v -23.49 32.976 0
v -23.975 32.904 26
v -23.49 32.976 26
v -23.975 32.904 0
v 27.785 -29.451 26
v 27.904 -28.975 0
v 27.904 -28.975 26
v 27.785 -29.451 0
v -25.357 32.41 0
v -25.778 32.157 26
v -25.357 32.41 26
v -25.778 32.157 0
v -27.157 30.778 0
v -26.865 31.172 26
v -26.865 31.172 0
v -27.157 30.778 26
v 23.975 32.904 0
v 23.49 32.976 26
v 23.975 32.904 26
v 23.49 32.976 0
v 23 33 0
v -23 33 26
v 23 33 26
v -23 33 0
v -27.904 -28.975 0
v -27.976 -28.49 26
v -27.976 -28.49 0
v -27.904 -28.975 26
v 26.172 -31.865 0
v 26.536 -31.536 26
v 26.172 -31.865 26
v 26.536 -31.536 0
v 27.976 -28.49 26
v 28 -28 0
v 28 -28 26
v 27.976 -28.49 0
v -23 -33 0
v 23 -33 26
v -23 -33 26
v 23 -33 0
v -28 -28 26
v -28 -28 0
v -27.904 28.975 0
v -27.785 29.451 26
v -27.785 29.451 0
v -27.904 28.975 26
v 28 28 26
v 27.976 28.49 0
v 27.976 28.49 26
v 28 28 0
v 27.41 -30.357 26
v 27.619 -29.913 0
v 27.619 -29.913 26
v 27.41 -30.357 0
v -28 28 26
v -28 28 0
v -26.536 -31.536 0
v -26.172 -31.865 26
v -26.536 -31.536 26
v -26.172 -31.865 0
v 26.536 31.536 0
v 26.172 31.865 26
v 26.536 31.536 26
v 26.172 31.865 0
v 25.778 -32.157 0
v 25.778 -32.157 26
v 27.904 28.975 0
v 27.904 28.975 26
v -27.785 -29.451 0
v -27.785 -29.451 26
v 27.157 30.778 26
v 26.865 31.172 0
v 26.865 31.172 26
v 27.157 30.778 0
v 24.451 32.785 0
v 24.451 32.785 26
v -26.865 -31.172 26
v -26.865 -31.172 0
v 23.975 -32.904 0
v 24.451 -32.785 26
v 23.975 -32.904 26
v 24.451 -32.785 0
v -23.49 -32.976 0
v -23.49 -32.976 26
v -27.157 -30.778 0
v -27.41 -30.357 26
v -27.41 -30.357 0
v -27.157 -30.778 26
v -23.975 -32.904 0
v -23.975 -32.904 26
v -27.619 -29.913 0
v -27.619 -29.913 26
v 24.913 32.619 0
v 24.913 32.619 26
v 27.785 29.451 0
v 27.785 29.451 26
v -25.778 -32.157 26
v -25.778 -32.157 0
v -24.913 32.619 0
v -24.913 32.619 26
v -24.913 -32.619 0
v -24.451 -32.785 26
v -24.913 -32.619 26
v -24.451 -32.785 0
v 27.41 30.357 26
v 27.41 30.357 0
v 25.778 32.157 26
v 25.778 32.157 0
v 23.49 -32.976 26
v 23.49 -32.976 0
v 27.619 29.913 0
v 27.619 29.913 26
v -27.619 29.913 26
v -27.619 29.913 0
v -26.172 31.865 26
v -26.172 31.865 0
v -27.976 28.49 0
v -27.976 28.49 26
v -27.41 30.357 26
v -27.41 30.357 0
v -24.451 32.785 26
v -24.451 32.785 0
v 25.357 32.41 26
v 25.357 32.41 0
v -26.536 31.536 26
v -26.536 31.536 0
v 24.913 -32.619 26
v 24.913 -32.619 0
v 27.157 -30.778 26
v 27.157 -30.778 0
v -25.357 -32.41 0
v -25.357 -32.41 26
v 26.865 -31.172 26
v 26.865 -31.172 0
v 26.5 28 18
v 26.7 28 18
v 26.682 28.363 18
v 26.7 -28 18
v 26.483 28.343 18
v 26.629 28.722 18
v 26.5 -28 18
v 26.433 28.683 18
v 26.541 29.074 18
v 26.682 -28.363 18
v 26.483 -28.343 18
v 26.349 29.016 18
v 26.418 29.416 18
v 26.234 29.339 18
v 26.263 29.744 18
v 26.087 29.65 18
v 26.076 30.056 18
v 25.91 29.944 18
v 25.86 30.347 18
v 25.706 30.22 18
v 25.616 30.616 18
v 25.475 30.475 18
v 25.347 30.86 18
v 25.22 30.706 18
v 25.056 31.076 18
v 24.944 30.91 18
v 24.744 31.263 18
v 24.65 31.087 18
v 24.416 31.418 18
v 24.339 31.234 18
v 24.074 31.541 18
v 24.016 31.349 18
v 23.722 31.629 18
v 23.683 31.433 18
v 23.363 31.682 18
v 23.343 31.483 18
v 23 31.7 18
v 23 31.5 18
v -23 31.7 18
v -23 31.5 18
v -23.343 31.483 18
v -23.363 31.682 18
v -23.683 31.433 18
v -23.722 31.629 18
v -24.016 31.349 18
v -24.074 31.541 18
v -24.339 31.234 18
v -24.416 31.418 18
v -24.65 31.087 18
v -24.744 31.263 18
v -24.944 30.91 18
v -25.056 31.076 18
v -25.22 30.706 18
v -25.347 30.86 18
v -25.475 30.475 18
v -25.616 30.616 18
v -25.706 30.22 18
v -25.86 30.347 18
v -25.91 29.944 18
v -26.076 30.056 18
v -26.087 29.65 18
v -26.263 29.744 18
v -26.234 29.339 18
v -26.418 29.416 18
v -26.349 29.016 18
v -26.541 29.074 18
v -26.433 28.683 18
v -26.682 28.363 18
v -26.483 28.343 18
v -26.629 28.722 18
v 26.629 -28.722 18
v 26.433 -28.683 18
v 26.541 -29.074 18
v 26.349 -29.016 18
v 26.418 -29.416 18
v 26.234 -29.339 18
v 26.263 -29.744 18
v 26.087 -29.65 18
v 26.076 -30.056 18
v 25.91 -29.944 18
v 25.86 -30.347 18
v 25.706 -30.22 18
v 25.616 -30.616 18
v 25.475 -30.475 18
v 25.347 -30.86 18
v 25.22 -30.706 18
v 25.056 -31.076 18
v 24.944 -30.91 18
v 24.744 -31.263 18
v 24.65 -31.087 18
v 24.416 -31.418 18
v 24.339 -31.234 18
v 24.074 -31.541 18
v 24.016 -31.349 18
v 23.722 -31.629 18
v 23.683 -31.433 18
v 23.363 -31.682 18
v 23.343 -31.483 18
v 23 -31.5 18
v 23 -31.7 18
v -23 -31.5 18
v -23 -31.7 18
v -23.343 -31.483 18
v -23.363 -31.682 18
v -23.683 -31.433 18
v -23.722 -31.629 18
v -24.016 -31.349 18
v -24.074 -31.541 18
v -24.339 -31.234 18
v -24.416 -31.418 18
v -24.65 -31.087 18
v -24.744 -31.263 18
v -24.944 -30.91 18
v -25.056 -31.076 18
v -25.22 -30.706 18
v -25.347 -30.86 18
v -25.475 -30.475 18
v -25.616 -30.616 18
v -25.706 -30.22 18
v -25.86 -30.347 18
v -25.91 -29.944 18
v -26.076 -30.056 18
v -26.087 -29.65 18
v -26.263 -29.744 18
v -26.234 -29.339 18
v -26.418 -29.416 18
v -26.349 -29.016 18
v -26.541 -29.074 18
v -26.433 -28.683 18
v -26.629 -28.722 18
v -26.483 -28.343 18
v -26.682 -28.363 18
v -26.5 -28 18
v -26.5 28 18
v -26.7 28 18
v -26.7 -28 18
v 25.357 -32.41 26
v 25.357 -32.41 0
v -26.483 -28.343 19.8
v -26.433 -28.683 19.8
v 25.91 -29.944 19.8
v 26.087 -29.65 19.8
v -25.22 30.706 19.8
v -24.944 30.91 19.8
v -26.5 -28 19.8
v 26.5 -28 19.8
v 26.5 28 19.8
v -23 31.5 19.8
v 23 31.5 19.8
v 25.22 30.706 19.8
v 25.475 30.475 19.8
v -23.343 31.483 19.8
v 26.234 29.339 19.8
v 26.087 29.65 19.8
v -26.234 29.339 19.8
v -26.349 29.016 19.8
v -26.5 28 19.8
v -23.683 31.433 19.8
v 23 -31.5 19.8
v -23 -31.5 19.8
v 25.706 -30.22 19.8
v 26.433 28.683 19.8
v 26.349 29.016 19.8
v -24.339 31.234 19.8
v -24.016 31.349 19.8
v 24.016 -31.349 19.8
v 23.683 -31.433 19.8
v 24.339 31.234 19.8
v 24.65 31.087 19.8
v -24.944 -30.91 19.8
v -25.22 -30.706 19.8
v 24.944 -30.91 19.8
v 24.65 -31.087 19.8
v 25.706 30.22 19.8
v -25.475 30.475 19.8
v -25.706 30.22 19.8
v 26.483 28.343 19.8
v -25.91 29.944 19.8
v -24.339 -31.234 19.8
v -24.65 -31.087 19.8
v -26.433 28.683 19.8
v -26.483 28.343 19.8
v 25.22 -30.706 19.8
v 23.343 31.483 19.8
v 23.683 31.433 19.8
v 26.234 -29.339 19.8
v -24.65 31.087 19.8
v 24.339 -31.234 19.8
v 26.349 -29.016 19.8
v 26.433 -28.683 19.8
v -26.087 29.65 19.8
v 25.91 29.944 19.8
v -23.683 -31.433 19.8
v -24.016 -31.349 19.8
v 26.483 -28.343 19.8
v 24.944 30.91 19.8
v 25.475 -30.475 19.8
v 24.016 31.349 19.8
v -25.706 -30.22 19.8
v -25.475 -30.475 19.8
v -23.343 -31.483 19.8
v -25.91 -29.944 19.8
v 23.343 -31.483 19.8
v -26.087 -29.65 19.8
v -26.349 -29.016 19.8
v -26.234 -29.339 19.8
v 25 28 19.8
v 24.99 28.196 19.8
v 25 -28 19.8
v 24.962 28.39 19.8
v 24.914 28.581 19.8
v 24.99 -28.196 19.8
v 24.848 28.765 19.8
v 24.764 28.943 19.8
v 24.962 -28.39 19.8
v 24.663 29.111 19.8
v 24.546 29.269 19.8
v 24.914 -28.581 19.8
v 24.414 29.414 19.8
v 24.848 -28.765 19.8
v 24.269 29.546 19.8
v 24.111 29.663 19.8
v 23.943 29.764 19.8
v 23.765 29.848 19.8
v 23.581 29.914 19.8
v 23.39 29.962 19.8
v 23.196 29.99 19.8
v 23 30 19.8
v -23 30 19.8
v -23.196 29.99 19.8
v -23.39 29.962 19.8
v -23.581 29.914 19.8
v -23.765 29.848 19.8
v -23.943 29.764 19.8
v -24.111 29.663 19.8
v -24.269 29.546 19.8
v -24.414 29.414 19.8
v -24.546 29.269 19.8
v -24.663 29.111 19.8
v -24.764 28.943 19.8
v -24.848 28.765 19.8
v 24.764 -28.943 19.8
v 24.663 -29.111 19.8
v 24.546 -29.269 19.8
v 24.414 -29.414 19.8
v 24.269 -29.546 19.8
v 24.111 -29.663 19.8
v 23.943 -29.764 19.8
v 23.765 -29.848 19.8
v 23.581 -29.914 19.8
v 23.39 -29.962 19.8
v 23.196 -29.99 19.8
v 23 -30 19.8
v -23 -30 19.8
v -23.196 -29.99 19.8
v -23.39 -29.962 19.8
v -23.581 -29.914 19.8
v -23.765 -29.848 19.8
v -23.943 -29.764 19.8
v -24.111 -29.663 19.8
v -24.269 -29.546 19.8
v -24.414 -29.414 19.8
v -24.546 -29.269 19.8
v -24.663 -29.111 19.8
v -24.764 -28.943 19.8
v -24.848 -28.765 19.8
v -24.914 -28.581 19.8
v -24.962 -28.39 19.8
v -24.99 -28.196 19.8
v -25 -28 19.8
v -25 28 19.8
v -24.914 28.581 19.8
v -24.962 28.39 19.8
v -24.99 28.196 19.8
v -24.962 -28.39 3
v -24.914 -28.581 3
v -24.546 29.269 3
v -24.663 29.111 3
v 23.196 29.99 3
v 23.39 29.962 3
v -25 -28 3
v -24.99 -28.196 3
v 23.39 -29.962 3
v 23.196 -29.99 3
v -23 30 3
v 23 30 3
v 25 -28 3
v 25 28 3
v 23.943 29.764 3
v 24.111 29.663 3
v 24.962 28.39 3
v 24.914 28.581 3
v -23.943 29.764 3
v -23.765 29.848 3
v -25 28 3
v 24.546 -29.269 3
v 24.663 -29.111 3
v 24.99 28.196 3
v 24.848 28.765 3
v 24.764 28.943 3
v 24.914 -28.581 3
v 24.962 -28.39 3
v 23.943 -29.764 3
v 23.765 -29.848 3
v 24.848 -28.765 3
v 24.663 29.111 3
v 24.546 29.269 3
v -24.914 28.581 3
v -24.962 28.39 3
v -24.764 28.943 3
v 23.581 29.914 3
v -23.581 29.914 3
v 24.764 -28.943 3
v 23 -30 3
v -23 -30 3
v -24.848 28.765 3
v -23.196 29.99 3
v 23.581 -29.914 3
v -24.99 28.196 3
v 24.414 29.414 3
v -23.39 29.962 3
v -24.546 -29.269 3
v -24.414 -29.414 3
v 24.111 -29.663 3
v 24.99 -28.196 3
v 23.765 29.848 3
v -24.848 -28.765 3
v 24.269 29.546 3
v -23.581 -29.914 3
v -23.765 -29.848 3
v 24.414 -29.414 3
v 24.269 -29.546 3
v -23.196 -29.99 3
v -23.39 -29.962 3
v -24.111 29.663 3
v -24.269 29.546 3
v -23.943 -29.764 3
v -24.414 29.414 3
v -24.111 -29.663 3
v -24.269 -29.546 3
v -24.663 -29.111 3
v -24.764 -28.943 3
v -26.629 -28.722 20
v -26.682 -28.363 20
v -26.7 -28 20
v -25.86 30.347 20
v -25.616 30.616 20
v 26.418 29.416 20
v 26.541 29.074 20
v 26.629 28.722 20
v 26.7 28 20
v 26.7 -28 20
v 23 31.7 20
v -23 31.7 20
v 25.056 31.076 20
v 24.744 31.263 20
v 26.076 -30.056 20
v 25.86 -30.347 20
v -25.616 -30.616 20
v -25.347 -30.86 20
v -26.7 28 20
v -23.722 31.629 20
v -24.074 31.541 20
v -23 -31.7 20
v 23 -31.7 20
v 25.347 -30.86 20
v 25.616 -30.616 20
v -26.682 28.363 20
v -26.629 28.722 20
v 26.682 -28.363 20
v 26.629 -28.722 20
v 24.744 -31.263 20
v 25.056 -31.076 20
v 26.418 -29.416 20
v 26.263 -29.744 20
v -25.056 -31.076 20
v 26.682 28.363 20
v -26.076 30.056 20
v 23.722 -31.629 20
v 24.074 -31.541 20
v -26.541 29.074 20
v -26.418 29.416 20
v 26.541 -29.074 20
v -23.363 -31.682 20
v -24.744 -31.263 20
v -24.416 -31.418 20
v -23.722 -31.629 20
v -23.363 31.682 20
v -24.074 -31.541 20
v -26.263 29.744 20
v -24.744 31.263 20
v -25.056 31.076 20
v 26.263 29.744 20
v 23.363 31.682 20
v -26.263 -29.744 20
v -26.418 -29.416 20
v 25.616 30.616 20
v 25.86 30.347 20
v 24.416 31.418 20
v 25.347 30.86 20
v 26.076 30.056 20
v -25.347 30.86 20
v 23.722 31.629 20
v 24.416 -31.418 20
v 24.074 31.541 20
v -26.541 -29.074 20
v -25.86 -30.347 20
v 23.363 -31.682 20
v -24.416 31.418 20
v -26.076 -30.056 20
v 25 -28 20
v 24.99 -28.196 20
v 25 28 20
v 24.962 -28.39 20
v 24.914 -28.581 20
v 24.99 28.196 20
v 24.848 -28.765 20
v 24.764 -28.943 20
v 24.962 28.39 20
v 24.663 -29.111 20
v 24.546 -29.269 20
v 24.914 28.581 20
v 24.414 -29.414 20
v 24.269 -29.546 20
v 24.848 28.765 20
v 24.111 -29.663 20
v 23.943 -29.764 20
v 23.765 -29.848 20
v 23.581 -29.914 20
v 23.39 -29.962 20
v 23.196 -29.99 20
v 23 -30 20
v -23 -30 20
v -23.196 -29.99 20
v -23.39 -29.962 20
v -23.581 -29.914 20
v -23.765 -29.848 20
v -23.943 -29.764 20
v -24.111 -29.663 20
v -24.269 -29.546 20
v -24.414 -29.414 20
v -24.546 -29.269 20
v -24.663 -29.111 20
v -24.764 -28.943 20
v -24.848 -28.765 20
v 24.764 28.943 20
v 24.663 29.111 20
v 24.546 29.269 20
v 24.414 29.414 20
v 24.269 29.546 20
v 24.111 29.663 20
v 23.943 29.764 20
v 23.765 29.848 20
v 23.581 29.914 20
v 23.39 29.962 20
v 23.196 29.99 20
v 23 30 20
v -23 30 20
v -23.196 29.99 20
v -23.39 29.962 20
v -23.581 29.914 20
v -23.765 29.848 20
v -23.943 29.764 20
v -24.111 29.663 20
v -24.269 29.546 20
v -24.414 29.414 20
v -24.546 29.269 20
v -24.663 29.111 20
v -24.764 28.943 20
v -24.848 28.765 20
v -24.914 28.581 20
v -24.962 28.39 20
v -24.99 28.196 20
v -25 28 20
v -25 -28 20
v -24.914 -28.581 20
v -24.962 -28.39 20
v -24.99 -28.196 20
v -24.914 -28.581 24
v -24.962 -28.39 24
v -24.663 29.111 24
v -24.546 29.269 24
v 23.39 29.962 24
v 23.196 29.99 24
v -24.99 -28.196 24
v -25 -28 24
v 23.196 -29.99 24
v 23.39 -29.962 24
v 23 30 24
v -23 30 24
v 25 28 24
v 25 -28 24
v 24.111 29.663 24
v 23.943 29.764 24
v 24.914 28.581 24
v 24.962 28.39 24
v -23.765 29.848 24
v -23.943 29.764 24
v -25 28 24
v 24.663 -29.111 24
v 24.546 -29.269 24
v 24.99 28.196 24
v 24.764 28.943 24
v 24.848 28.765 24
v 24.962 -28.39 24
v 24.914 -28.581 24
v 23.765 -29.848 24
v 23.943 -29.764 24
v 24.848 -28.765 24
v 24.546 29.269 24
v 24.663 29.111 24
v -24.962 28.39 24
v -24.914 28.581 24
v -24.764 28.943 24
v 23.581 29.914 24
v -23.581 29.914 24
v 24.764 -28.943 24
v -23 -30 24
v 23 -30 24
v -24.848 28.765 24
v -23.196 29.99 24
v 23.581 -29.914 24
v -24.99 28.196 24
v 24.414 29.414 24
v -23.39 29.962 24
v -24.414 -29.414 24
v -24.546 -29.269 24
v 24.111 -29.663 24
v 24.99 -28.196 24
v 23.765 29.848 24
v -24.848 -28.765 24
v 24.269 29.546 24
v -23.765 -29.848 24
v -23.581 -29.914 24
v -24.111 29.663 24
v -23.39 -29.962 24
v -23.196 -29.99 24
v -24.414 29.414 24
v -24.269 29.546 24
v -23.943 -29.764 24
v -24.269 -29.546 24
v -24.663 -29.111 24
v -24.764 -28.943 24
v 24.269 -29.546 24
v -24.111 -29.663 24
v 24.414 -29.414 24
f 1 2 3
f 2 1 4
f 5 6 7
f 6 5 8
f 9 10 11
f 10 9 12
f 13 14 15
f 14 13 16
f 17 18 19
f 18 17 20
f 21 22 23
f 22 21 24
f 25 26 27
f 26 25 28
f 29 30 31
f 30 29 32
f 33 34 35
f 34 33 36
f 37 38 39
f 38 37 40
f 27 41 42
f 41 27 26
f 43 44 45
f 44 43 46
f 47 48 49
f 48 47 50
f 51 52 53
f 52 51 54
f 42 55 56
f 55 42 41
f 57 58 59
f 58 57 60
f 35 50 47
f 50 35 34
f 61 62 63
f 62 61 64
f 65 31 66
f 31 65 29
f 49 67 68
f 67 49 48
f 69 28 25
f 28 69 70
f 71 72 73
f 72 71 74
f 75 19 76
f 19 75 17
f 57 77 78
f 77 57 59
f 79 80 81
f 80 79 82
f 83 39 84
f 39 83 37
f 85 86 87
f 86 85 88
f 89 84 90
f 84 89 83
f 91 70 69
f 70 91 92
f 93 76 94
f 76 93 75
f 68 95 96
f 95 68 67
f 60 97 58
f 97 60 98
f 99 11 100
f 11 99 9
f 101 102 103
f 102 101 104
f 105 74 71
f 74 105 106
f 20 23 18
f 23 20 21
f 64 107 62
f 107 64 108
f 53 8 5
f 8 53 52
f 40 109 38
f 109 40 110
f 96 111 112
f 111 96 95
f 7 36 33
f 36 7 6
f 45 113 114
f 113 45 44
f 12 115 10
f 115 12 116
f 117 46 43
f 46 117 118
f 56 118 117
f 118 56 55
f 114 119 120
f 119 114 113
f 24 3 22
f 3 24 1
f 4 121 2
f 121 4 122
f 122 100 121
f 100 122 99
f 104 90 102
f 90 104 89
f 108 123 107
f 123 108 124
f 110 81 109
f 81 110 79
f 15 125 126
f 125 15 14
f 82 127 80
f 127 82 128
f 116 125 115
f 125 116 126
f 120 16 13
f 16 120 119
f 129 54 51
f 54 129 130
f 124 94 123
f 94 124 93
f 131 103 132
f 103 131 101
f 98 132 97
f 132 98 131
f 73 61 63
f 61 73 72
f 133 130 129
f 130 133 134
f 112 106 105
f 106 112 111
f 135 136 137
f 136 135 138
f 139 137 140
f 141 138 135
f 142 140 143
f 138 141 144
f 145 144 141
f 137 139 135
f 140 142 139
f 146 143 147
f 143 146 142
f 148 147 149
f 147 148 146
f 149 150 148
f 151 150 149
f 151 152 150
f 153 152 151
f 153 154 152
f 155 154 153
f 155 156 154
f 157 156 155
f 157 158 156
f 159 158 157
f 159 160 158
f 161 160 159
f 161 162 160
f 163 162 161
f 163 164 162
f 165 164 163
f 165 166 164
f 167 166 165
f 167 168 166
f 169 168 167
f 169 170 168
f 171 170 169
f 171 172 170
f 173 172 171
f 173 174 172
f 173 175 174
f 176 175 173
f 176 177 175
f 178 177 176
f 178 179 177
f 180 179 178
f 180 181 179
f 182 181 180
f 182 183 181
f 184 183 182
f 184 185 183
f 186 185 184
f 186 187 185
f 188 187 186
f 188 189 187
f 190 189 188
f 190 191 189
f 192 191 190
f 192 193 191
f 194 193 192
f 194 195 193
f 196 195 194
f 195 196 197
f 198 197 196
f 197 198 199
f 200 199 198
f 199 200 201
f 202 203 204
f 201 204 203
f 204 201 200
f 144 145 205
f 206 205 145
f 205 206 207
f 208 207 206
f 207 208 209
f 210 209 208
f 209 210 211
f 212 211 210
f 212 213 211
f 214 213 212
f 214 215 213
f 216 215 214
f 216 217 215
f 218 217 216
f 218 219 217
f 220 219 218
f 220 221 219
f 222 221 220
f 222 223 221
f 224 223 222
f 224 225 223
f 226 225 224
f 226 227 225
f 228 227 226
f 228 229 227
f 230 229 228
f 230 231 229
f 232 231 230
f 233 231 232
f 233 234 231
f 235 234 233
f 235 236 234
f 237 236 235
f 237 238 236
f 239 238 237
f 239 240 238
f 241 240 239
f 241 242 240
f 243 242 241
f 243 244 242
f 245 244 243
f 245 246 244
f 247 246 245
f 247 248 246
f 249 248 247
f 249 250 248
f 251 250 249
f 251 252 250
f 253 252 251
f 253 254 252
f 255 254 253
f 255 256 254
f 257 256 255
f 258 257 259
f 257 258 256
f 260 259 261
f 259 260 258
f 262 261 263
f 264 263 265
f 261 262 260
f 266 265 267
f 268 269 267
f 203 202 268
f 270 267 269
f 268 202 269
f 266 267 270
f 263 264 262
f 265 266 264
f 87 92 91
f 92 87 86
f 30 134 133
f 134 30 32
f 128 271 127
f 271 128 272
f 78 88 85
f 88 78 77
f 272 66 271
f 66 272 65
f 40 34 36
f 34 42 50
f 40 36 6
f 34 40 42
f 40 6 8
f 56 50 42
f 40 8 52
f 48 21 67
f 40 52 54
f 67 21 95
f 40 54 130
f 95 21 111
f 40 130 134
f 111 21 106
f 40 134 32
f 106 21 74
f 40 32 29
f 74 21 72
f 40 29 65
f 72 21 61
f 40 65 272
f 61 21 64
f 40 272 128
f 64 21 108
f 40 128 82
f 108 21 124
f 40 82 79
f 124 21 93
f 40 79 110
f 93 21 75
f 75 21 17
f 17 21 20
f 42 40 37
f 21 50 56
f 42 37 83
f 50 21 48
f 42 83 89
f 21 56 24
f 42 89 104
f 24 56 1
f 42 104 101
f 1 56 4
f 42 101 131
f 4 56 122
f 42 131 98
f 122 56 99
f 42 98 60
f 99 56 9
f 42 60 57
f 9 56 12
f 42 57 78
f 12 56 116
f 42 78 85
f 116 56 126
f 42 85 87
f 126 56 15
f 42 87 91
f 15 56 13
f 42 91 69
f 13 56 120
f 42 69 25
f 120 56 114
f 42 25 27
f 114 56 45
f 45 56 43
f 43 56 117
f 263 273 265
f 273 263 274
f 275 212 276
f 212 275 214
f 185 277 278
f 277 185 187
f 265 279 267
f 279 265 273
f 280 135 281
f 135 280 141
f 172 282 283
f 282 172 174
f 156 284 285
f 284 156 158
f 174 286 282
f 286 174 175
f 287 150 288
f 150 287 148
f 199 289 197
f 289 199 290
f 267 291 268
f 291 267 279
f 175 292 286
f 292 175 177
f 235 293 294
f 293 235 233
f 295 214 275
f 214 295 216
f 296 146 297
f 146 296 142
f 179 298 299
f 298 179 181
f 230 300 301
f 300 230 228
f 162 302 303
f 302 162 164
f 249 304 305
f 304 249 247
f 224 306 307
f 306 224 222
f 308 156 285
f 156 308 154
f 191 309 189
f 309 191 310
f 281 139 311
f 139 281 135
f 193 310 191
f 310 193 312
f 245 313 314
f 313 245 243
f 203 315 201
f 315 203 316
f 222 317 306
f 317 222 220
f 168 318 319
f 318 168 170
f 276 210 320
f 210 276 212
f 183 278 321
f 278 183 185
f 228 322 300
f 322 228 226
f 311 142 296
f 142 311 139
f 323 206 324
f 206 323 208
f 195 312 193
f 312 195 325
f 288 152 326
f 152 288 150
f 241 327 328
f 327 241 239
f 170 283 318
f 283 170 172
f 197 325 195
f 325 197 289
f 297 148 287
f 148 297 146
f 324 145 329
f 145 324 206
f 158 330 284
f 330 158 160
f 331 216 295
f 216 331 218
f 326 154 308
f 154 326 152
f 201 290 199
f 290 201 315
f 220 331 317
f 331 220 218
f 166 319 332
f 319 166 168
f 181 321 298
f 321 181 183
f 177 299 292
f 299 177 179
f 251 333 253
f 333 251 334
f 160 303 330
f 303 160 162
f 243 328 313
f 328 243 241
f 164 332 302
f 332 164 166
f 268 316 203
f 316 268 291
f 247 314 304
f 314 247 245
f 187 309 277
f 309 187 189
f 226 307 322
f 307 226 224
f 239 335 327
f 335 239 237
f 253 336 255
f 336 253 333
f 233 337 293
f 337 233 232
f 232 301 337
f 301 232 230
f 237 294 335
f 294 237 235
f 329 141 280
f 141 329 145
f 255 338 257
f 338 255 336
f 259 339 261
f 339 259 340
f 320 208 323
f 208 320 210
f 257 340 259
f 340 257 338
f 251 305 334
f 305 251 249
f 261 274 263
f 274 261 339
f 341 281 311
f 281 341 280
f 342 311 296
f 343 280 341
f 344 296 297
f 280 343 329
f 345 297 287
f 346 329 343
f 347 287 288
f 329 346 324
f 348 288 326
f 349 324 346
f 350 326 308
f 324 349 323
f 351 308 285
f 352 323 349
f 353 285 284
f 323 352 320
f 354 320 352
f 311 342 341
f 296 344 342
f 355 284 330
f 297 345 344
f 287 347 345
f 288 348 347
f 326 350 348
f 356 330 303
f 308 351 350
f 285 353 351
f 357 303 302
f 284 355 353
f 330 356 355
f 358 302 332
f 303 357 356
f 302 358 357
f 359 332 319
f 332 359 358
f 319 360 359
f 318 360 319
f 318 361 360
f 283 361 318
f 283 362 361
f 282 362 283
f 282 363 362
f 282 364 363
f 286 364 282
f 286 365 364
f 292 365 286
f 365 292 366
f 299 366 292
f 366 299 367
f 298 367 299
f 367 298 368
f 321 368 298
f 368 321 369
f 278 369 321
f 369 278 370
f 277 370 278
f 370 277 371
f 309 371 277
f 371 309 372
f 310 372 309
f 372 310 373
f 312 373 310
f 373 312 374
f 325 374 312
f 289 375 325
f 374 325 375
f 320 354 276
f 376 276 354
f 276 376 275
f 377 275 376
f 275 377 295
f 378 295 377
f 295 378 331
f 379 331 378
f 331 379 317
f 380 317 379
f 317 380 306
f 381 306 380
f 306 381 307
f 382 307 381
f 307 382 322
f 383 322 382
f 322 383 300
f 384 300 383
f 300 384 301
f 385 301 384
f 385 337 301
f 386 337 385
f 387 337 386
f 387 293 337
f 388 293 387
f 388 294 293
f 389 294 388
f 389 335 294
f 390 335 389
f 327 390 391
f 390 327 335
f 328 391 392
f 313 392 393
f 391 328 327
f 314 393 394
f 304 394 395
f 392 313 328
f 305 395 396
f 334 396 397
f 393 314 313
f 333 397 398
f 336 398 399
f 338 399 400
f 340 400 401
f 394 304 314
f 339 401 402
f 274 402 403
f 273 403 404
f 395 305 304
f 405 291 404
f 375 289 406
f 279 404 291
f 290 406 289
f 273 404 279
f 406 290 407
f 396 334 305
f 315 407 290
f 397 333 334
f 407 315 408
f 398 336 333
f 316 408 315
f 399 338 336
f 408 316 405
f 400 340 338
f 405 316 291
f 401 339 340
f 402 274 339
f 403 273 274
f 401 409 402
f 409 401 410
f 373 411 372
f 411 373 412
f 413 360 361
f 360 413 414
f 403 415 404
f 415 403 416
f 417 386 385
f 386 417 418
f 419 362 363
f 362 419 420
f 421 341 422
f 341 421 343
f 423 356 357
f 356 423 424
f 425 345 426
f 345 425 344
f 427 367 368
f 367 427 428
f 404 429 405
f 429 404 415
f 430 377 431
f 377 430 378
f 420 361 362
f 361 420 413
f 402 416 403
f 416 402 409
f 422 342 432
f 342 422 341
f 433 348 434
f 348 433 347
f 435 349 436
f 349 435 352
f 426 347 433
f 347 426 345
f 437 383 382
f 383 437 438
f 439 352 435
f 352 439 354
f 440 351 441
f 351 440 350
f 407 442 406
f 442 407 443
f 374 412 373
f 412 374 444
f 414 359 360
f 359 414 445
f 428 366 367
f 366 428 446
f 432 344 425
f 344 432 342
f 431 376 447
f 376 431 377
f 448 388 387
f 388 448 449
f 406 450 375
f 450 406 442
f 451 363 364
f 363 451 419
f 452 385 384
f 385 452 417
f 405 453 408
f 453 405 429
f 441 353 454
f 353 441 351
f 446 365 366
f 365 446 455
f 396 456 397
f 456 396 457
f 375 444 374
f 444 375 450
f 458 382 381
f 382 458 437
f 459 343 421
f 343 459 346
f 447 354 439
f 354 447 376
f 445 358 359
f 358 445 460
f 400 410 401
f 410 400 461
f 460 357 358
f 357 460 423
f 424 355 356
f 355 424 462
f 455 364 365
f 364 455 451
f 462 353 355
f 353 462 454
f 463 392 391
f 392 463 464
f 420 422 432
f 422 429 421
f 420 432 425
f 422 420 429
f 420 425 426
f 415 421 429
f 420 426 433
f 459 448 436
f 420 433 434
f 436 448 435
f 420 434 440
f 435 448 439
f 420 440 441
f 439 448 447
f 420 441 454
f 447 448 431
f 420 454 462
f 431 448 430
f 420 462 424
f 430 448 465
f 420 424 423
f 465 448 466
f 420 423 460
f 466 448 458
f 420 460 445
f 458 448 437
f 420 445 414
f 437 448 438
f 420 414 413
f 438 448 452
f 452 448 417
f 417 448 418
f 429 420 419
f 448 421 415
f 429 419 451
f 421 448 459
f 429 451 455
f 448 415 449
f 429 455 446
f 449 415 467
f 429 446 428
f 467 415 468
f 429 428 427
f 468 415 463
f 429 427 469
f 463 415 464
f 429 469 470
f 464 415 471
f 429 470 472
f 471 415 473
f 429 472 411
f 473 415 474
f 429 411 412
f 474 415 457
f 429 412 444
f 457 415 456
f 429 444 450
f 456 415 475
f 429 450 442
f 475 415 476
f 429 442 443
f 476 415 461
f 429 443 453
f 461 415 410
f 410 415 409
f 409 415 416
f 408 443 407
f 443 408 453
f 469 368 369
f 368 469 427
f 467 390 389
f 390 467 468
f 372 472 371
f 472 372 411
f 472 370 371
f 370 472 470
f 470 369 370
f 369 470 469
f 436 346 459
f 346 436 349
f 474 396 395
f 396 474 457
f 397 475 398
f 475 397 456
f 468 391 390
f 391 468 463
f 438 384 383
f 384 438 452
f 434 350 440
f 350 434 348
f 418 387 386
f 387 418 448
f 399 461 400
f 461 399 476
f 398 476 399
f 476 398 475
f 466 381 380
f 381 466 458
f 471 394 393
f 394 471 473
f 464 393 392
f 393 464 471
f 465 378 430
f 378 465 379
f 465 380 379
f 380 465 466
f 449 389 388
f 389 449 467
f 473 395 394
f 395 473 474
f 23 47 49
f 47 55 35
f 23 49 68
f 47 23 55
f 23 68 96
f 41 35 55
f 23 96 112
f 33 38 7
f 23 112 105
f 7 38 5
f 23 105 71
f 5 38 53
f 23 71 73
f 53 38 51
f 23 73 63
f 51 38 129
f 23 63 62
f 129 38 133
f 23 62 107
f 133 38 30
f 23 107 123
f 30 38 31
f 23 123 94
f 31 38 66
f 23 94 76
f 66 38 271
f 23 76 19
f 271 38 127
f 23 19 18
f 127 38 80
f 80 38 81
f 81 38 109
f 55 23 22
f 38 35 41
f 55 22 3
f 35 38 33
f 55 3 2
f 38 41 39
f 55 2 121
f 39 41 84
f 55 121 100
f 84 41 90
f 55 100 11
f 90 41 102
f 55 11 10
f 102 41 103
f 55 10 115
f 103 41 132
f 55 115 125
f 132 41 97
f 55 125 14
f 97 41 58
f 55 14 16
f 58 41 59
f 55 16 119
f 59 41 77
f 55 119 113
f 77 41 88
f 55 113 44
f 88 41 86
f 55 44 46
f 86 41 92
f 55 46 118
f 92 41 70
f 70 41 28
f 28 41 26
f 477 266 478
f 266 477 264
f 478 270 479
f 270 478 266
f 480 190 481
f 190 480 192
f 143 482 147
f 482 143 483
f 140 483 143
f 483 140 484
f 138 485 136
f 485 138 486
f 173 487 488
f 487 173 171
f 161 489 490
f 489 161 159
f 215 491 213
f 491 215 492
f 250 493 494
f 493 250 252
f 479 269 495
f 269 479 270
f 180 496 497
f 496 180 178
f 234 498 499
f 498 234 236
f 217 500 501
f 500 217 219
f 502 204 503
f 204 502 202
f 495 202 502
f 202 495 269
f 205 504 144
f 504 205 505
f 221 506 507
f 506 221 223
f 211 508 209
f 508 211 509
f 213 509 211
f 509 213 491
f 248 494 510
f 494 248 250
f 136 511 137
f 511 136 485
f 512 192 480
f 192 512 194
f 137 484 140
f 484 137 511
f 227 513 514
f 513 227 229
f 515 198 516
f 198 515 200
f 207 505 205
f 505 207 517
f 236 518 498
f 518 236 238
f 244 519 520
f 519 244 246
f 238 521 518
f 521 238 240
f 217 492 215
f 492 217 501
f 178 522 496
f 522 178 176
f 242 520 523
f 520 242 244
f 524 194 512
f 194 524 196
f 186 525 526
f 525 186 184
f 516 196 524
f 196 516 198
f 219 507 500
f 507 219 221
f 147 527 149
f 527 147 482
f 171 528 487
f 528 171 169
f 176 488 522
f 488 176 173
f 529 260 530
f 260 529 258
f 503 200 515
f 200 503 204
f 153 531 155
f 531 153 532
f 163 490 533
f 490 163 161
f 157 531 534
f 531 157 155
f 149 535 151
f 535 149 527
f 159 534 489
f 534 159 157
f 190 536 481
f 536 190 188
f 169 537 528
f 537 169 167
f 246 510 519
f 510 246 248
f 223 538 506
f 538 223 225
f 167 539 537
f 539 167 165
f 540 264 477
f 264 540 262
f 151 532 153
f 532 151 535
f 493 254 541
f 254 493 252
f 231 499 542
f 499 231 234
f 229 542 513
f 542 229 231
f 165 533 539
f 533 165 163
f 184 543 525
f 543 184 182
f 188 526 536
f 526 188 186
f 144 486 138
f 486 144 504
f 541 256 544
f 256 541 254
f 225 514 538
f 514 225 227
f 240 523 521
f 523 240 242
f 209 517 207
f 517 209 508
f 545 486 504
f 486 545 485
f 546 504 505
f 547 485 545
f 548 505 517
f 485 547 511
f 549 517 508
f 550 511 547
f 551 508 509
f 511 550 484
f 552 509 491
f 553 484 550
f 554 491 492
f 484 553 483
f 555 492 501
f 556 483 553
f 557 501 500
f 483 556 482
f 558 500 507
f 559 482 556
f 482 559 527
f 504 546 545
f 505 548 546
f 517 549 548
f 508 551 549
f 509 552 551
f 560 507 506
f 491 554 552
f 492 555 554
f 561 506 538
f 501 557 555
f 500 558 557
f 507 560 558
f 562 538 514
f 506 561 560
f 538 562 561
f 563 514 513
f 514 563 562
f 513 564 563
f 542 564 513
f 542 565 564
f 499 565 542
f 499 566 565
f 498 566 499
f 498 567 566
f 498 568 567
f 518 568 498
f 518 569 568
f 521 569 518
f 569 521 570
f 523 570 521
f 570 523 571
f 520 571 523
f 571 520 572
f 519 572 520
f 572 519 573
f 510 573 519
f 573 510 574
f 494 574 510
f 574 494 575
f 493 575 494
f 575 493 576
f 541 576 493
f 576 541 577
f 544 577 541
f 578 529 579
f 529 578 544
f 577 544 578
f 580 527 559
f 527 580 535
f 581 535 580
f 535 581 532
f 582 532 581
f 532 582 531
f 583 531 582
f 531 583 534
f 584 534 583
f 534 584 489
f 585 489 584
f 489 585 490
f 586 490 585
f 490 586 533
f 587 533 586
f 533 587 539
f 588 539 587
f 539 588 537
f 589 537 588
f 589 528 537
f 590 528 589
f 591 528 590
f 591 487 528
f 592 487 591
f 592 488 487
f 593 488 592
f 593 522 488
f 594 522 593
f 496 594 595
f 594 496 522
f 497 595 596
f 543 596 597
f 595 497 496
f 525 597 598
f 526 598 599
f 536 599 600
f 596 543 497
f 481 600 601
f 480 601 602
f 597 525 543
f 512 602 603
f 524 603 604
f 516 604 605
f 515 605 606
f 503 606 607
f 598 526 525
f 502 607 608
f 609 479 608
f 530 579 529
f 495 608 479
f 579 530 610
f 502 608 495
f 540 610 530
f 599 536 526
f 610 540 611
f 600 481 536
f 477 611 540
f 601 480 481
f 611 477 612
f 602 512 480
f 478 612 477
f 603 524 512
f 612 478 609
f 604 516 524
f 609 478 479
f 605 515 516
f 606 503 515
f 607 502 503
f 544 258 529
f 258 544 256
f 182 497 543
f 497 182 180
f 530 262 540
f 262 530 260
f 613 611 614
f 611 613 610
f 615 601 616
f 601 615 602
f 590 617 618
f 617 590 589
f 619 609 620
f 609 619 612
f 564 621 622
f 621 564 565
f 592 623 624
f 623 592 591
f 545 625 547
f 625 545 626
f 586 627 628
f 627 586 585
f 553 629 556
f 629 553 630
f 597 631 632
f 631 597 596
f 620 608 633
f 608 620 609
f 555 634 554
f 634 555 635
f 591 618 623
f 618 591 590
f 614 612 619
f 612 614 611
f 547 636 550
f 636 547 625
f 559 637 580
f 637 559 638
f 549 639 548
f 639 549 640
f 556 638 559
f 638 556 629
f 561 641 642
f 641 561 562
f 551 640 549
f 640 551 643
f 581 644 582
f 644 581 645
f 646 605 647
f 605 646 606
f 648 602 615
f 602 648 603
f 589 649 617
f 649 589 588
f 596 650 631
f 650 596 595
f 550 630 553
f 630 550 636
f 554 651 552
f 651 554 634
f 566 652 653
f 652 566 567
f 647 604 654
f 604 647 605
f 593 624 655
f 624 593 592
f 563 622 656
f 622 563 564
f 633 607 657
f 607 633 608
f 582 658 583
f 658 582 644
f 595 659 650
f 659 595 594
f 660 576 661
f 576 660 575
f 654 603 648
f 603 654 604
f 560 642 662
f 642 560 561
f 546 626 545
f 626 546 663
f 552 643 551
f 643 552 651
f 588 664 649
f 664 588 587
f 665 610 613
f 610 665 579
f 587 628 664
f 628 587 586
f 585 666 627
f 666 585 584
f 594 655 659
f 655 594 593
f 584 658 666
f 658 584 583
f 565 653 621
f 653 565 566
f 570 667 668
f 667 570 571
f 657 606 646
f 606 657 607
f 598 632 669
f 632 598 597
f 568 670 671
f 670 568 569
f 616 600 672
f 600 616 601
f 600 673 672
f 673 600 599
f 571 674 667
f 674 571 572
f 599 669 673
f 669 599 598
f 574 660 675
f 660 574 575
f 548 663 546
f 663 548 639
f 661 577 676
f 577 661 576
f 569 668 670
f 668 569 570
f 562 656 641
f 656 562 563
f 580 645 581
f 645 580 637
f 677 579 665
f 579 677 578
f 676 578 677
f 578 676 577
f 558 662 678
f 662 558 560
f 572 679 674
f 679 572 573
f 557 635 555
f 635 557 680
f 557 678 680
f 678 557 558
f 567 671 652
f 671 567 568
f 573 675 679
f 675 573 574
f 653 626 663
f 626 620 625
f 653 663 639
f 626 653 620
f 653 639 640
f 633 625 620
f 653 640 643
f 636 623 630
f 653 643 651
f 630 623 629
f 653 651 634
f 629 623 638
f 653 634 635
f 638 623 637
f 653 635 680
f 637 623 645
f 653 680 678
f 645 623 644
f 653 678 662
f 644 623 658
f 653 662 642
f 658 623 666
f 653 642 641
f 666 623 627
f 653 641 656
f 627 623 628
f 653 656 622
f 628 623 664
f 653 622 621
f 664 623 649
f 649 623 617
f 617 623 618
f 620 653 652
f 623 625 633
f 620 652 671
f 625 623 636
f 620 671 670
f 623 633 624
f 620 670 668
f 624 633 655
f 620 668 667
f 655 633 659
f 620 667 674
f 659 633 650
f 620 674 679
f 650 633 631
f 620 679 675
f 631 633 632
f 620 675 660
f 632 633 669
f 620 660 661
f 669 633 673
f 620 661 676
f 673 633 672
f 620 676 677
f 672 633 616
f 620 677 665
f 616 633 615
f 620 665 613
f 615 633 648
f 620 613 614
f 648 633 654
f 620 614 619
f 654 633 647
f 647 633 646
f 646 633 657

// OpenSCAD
// ============================================================================
// 3D-PRINTABLE TWO-PART ENCLOSURE WITH SHIPLAP JOINT
// ============================================================================
// Designed by: Senior Mechanical & DFM Engineer
// Cavity Size: 50 x 60 x 20 mm (Minimum)
// Wall Thickness: 3.0 mm
// Nominal Print Clearance: 0.2 mm
//
// DESIGN & DFM FEATURES:
// 1. Shiplap (stepped) joint provides dust protection and self-alignment.
// 2. 0.2 mm horizontal and vertical clearances prevent interference.
// 3. Flat bottom and top surfaces ensure excellent bed adhesion (no supports).
// 4. Fully parameterized model.
// ============================================================================

/* [View Options] */
// Select assembly view mode
view_mode = "assembled"; // [assembled, exploded, side_by_side]

// Separation distance when in exploded view
explode_gap = 40; // [10:100]

/* [Enclosure Dimensions] */
// Internal cavity width (X)
width_in = 50.0;
// Internal cavity length (Y)
length_in = 60.0;
// Internal cavity height allocated to base
height_in_base = 15.0;
// Internal cavity height allocated to lid
height_in_lid = 5.0; // Total internal height = 15 + 5 = 20.0 mm
// Nominal wall thickness
wall_thickness = 3.0;
// Exterior corner radius
radius_out = 5.0;

/* [Joint Parameters] */
// Printer-specific tolerance/clearance for sliding fit
joint_clearance = 0.2;
// Thickness of the mating lip (half of wall thickness)
lip_width = 1.5; 
// Height of the mating lip
height_lip = 1.8; // 2.0 mm nominal minus 0.2 mm vertical clearance
// Depth of the receiving recess
recess_depth = 2.0;

/* [Computed Dimensions] */
radius_in = max(0.5, radius_out - wall_thickness); // Maintain uniform wall thickness (2.0 mm)
width_out = width_in + 2 * wall_thickness;         // 56.0 mm
length_out = length_in + 2 * wall_thickness;       // 66.0 mm
height_base = height_in_base + wall_thickness;     // 18.0 mm

// Shiplap lip parameters
width_lip = width_in + 2 * lip_width;   // 53.0 mm
length_lip = length_in + 2 * lip_width; // 63.0 mm
radius_lip = radius_in + lip_width;     // 3.5 mm

// Lid heights to ensure exact 3.0 mm ceiling thickness
lid_cavity_height = height_in_lid - recess_depth; // 3.0 mm
height_lid = recess_depth + lid_cavity_height + wall_thickness; // 8.0 mm

// Smoothness of rounded corners
$fn = 64;

// ============================================================================
// HELPER MODULES
// ============================================================================

// 2D Rounded Rectangle
module rounded_rect(w, l, r) {
    x_limit = w/2 - r;
    y_limit = l/2 - r;
    hull() {
        translate([ x_limit,  y_limit, 0]) circle(r);
        translate([-x_limit,  y_limit, 0]) circle(r);
        translate([ x_limit, -y_limit, 0]) circle(r);
        translate([-x_limit, -y_limit, 0]) circle(r);
    }
}

// 3D Rounded Box (extrude of 2D rounded rectangle)
module rounded_box(w, l, h, r) {
    linear_extrude(height=h) rounded_rect(w, l, r);
}

// ============================================================================
// CORE COMPONENTS
// ============================================================================

// Base Component
module base() {
    difference() {
        union() {
            // Main exterior body
            rounded_box(width_out, length_out, height_base, radius_out);
            
            // Mating lip (tongue)
            translate([0, 0, height_base])
                rounded_box(width_lip, length_lip, height_lip, radius_lip);
        }
        
        // Inner cavity (extends through the lip to hollow out the part)
        translate([0, 0, wall_thickness])
            rounded_box(width_in, length_in, height_base + height_lip + 1.0, radius_in);
    }
}

// Lid Component
module lid() {
    difference() {
        // Main exterior body
        rounded_box(width_out, length_out, height_lid, radius_out);

        // Joint recess (groove) with horizontal and vertical clearances applied
        translate([0, 0, -0.1])
            rounded_box(
                width_lip + 2 * joint_clearance, 
                length_lip + 2 * joint_clearance, 
                recess_depth + 0.1, 
                radius_lip + joint_clearance
            );

        // Inner cavity of the lid (starts at step height and goes up to ceiling)
        translate([0, 0, recess_depth])
            rounded_box(width_in, length_in, lid_cavity_height + 1.0, radius_in);
    }
}

// ============================================================================
// ASSEMBLY & LAYOUT SCENE
// ============================================================================

if (view_mode == "assembled") {
    // Rendered in exact assembled nominal positions
    color("#2a9d8f") base();
    translate([0, 0, height_base]) color("#e76f51") lid();

} else if (view_mode == "exploded") {
    // Rendered exploded along the Z axis for inspection
    color("#2a9d8f") base();
    translate([0, 0, height_base + explode_gap]) color("#e76f51") lid();

} else if (view_mode == "side_by_side") {
    // Flipped flat on the build plate (Z=0) for easy slicing and DFM assessment
    translate([0, -length_out/2 - 10, 0]) 
        color("#2a9d8f") base();
        
    translate([0, length_out/2 + 10, height_lid]) 
        rotate([180, 0, 0]) 
            color("#e76f51") lid();
}
